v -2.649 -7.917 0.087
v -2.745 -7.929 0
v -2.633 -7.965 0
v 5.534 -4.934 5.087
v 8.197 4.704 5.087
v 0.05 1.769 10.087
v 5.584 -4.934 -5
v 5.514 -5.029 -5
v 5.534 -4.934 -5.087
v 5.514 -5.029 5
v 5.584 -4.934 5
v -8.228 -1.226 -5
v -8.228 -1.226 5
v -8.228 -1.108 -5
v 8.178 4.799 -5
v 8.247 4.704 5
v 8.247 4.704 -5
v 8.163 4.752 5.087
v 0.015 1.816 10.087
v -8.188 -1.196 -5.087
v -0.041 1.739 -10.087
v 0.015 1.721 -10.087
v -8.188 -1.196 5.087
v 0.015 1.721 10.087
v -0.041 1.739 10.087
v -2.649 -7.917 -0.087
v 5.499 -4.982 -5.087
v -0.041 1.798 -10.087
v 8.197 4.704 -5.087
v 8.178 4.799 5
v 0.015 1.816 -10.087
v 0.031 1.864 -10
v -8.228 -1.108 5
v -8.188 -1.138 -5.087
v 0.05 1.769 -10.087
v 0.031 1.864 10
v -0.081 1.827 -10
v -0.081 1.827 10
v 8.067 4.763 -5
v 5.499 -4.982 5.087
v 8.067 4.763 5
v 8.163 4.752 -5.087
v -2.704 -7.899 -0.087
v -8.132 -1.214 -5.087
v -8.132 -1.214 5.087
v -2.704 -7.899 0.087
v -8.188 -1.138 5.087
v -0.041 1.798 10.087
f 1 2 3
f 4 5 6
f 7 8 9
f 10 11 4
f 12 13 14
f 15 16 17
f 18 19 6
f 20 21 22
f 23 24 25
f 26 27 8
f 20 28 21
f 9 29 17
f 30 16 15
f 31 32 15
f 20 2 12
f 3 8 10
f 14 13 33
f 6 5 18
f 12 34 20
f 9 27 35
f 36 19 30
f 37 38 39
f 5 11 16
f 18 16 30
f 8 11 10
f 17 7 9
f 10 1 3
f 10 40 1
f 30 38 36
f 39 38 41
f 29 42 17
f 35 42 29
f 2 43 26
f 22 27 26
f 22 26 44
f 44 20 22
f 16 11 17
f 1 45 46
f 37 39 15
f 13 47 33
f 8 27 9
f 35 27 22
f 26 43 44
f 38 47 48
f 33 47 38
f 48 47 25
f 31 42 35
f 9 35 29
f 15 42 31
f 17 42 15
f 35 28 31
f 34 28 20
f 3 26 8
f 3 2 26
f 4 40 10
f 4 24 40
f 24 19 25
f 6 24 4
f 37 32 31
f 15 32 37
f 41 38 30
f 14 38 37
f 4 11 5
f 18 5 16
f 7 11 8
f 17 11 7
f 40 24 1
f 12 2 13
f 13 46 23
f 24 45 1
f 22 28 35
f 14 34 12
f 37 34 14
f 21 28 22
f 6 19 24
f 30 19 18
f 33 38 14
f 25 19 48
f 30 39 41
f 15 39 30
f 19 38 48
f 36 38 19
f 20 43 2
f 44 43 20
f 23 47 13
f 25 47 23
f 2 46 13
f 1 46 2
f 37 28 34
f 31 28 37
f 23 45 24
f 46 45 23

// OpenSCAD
// Auto-generated OpenSCAD file

    inner_points = 10*[[0.5483513328711939, -0.49343059621073404, 0.5000000000001427], [-0.8147584849794822, -0.1166924584026583, 0.5000000000000114], [0.8147454248469246, 0.4704335994932656, -0.5000000000000114], [-0.2664006220419612, -0.7869936251588691, 1.539879335155092e-13], [-6.530066327234646e-06, 0.17687057054547678, 1.0], [-6.5300662304823955e-06, 0.1768705705451305, -1.0], [0.5483513328712422, -0.4934305962109071, -0.4999999999998575], [-0.8147584849794339, -0.11669245840283138, -0.4999999999999886], [0.8147454248468763, 0.47043359949343866, 0.4999999999999886]];

    outer_points = 10*[[0.2886841223116632, 0.4999680237807507, -0.8165129838048599], [0.8660438627157157, -0.4999680237807507, 5.5219683157359256e-05], [-0.8660438627157157, 0.4999680237807507, -5.5219683157359256e-05], [0.2887210423333781, -0.5000319741744229, -0.8164607672859469], [0.8660069426940007, 0.5000319741744229, 3.0031642442862605e-06], [-0.8660069426940007, -0.5000319741744229, -3.0031642442862605e-06], [-0.5773228203823376, -6.395039367218525e-05, -0.8165159869691043], [3.692002171488182e-05, -0.9999999979551737, 5.221651891308081e-05], [-3.692002171488182e-05, 0.9999999979551737, -5.221651891308081e-05]];

    // Convex hull for inner set (I)
    module inner_hull() {
        hull() {
            for (p = inner_points) {
                translate(p) sphere(r=0.1);
            }
        }
    }

    // Convex hull for outer set (O) minus inner hull (O \ I)
    module outer_minus_inner() {
        difference() {
            hull() {
                for (p = outer_points) {
                    translate(p) sphere(r=0.1);
                }
            }
            inner_hull(); // Subtract inner hull
        }
    }

    // Convex hull for outer set (O) minus all translated inner hulls
    module outer_minus_AllTranslationInner() {
        difference() {
            hull() {
                for (p = outer_points) {
                    translate(p) sphere(r=0.1);
                }
            }
            hull() {
                translate([0,0,50]) inner_hull();
                translate([0,0,-50]) inner_hull();
            }; // Subtract translated inner hulls
        }
    }

    // Difference between outer_minus_inner and outer_minus_AllTranslationInner
    module outer_minus_inner_diff() {
        difference() {
            // Outer minus inner
            difference() {
                hull() {
                    for (p = outer_points) {
                        translate(p) sphere(r=0.1);
                    }
                }
                inner_hull();
            }

            // Subtract Outer minus AllTranslationInner
            difference() {
                hull() {
                    for (p = outer_points) {
                        translate(p) sphere(r=0.1);
                    }
                }
                hull() {
                    translate([0,0,50]) inner_hull();
                    translate([0,0,-50]) inner_hull();
                };
            }
        }
    }

    // Rendering all with colors applied
    color([1, 0, 0, 0.5]) inner_hull(); // Transparent red
    
